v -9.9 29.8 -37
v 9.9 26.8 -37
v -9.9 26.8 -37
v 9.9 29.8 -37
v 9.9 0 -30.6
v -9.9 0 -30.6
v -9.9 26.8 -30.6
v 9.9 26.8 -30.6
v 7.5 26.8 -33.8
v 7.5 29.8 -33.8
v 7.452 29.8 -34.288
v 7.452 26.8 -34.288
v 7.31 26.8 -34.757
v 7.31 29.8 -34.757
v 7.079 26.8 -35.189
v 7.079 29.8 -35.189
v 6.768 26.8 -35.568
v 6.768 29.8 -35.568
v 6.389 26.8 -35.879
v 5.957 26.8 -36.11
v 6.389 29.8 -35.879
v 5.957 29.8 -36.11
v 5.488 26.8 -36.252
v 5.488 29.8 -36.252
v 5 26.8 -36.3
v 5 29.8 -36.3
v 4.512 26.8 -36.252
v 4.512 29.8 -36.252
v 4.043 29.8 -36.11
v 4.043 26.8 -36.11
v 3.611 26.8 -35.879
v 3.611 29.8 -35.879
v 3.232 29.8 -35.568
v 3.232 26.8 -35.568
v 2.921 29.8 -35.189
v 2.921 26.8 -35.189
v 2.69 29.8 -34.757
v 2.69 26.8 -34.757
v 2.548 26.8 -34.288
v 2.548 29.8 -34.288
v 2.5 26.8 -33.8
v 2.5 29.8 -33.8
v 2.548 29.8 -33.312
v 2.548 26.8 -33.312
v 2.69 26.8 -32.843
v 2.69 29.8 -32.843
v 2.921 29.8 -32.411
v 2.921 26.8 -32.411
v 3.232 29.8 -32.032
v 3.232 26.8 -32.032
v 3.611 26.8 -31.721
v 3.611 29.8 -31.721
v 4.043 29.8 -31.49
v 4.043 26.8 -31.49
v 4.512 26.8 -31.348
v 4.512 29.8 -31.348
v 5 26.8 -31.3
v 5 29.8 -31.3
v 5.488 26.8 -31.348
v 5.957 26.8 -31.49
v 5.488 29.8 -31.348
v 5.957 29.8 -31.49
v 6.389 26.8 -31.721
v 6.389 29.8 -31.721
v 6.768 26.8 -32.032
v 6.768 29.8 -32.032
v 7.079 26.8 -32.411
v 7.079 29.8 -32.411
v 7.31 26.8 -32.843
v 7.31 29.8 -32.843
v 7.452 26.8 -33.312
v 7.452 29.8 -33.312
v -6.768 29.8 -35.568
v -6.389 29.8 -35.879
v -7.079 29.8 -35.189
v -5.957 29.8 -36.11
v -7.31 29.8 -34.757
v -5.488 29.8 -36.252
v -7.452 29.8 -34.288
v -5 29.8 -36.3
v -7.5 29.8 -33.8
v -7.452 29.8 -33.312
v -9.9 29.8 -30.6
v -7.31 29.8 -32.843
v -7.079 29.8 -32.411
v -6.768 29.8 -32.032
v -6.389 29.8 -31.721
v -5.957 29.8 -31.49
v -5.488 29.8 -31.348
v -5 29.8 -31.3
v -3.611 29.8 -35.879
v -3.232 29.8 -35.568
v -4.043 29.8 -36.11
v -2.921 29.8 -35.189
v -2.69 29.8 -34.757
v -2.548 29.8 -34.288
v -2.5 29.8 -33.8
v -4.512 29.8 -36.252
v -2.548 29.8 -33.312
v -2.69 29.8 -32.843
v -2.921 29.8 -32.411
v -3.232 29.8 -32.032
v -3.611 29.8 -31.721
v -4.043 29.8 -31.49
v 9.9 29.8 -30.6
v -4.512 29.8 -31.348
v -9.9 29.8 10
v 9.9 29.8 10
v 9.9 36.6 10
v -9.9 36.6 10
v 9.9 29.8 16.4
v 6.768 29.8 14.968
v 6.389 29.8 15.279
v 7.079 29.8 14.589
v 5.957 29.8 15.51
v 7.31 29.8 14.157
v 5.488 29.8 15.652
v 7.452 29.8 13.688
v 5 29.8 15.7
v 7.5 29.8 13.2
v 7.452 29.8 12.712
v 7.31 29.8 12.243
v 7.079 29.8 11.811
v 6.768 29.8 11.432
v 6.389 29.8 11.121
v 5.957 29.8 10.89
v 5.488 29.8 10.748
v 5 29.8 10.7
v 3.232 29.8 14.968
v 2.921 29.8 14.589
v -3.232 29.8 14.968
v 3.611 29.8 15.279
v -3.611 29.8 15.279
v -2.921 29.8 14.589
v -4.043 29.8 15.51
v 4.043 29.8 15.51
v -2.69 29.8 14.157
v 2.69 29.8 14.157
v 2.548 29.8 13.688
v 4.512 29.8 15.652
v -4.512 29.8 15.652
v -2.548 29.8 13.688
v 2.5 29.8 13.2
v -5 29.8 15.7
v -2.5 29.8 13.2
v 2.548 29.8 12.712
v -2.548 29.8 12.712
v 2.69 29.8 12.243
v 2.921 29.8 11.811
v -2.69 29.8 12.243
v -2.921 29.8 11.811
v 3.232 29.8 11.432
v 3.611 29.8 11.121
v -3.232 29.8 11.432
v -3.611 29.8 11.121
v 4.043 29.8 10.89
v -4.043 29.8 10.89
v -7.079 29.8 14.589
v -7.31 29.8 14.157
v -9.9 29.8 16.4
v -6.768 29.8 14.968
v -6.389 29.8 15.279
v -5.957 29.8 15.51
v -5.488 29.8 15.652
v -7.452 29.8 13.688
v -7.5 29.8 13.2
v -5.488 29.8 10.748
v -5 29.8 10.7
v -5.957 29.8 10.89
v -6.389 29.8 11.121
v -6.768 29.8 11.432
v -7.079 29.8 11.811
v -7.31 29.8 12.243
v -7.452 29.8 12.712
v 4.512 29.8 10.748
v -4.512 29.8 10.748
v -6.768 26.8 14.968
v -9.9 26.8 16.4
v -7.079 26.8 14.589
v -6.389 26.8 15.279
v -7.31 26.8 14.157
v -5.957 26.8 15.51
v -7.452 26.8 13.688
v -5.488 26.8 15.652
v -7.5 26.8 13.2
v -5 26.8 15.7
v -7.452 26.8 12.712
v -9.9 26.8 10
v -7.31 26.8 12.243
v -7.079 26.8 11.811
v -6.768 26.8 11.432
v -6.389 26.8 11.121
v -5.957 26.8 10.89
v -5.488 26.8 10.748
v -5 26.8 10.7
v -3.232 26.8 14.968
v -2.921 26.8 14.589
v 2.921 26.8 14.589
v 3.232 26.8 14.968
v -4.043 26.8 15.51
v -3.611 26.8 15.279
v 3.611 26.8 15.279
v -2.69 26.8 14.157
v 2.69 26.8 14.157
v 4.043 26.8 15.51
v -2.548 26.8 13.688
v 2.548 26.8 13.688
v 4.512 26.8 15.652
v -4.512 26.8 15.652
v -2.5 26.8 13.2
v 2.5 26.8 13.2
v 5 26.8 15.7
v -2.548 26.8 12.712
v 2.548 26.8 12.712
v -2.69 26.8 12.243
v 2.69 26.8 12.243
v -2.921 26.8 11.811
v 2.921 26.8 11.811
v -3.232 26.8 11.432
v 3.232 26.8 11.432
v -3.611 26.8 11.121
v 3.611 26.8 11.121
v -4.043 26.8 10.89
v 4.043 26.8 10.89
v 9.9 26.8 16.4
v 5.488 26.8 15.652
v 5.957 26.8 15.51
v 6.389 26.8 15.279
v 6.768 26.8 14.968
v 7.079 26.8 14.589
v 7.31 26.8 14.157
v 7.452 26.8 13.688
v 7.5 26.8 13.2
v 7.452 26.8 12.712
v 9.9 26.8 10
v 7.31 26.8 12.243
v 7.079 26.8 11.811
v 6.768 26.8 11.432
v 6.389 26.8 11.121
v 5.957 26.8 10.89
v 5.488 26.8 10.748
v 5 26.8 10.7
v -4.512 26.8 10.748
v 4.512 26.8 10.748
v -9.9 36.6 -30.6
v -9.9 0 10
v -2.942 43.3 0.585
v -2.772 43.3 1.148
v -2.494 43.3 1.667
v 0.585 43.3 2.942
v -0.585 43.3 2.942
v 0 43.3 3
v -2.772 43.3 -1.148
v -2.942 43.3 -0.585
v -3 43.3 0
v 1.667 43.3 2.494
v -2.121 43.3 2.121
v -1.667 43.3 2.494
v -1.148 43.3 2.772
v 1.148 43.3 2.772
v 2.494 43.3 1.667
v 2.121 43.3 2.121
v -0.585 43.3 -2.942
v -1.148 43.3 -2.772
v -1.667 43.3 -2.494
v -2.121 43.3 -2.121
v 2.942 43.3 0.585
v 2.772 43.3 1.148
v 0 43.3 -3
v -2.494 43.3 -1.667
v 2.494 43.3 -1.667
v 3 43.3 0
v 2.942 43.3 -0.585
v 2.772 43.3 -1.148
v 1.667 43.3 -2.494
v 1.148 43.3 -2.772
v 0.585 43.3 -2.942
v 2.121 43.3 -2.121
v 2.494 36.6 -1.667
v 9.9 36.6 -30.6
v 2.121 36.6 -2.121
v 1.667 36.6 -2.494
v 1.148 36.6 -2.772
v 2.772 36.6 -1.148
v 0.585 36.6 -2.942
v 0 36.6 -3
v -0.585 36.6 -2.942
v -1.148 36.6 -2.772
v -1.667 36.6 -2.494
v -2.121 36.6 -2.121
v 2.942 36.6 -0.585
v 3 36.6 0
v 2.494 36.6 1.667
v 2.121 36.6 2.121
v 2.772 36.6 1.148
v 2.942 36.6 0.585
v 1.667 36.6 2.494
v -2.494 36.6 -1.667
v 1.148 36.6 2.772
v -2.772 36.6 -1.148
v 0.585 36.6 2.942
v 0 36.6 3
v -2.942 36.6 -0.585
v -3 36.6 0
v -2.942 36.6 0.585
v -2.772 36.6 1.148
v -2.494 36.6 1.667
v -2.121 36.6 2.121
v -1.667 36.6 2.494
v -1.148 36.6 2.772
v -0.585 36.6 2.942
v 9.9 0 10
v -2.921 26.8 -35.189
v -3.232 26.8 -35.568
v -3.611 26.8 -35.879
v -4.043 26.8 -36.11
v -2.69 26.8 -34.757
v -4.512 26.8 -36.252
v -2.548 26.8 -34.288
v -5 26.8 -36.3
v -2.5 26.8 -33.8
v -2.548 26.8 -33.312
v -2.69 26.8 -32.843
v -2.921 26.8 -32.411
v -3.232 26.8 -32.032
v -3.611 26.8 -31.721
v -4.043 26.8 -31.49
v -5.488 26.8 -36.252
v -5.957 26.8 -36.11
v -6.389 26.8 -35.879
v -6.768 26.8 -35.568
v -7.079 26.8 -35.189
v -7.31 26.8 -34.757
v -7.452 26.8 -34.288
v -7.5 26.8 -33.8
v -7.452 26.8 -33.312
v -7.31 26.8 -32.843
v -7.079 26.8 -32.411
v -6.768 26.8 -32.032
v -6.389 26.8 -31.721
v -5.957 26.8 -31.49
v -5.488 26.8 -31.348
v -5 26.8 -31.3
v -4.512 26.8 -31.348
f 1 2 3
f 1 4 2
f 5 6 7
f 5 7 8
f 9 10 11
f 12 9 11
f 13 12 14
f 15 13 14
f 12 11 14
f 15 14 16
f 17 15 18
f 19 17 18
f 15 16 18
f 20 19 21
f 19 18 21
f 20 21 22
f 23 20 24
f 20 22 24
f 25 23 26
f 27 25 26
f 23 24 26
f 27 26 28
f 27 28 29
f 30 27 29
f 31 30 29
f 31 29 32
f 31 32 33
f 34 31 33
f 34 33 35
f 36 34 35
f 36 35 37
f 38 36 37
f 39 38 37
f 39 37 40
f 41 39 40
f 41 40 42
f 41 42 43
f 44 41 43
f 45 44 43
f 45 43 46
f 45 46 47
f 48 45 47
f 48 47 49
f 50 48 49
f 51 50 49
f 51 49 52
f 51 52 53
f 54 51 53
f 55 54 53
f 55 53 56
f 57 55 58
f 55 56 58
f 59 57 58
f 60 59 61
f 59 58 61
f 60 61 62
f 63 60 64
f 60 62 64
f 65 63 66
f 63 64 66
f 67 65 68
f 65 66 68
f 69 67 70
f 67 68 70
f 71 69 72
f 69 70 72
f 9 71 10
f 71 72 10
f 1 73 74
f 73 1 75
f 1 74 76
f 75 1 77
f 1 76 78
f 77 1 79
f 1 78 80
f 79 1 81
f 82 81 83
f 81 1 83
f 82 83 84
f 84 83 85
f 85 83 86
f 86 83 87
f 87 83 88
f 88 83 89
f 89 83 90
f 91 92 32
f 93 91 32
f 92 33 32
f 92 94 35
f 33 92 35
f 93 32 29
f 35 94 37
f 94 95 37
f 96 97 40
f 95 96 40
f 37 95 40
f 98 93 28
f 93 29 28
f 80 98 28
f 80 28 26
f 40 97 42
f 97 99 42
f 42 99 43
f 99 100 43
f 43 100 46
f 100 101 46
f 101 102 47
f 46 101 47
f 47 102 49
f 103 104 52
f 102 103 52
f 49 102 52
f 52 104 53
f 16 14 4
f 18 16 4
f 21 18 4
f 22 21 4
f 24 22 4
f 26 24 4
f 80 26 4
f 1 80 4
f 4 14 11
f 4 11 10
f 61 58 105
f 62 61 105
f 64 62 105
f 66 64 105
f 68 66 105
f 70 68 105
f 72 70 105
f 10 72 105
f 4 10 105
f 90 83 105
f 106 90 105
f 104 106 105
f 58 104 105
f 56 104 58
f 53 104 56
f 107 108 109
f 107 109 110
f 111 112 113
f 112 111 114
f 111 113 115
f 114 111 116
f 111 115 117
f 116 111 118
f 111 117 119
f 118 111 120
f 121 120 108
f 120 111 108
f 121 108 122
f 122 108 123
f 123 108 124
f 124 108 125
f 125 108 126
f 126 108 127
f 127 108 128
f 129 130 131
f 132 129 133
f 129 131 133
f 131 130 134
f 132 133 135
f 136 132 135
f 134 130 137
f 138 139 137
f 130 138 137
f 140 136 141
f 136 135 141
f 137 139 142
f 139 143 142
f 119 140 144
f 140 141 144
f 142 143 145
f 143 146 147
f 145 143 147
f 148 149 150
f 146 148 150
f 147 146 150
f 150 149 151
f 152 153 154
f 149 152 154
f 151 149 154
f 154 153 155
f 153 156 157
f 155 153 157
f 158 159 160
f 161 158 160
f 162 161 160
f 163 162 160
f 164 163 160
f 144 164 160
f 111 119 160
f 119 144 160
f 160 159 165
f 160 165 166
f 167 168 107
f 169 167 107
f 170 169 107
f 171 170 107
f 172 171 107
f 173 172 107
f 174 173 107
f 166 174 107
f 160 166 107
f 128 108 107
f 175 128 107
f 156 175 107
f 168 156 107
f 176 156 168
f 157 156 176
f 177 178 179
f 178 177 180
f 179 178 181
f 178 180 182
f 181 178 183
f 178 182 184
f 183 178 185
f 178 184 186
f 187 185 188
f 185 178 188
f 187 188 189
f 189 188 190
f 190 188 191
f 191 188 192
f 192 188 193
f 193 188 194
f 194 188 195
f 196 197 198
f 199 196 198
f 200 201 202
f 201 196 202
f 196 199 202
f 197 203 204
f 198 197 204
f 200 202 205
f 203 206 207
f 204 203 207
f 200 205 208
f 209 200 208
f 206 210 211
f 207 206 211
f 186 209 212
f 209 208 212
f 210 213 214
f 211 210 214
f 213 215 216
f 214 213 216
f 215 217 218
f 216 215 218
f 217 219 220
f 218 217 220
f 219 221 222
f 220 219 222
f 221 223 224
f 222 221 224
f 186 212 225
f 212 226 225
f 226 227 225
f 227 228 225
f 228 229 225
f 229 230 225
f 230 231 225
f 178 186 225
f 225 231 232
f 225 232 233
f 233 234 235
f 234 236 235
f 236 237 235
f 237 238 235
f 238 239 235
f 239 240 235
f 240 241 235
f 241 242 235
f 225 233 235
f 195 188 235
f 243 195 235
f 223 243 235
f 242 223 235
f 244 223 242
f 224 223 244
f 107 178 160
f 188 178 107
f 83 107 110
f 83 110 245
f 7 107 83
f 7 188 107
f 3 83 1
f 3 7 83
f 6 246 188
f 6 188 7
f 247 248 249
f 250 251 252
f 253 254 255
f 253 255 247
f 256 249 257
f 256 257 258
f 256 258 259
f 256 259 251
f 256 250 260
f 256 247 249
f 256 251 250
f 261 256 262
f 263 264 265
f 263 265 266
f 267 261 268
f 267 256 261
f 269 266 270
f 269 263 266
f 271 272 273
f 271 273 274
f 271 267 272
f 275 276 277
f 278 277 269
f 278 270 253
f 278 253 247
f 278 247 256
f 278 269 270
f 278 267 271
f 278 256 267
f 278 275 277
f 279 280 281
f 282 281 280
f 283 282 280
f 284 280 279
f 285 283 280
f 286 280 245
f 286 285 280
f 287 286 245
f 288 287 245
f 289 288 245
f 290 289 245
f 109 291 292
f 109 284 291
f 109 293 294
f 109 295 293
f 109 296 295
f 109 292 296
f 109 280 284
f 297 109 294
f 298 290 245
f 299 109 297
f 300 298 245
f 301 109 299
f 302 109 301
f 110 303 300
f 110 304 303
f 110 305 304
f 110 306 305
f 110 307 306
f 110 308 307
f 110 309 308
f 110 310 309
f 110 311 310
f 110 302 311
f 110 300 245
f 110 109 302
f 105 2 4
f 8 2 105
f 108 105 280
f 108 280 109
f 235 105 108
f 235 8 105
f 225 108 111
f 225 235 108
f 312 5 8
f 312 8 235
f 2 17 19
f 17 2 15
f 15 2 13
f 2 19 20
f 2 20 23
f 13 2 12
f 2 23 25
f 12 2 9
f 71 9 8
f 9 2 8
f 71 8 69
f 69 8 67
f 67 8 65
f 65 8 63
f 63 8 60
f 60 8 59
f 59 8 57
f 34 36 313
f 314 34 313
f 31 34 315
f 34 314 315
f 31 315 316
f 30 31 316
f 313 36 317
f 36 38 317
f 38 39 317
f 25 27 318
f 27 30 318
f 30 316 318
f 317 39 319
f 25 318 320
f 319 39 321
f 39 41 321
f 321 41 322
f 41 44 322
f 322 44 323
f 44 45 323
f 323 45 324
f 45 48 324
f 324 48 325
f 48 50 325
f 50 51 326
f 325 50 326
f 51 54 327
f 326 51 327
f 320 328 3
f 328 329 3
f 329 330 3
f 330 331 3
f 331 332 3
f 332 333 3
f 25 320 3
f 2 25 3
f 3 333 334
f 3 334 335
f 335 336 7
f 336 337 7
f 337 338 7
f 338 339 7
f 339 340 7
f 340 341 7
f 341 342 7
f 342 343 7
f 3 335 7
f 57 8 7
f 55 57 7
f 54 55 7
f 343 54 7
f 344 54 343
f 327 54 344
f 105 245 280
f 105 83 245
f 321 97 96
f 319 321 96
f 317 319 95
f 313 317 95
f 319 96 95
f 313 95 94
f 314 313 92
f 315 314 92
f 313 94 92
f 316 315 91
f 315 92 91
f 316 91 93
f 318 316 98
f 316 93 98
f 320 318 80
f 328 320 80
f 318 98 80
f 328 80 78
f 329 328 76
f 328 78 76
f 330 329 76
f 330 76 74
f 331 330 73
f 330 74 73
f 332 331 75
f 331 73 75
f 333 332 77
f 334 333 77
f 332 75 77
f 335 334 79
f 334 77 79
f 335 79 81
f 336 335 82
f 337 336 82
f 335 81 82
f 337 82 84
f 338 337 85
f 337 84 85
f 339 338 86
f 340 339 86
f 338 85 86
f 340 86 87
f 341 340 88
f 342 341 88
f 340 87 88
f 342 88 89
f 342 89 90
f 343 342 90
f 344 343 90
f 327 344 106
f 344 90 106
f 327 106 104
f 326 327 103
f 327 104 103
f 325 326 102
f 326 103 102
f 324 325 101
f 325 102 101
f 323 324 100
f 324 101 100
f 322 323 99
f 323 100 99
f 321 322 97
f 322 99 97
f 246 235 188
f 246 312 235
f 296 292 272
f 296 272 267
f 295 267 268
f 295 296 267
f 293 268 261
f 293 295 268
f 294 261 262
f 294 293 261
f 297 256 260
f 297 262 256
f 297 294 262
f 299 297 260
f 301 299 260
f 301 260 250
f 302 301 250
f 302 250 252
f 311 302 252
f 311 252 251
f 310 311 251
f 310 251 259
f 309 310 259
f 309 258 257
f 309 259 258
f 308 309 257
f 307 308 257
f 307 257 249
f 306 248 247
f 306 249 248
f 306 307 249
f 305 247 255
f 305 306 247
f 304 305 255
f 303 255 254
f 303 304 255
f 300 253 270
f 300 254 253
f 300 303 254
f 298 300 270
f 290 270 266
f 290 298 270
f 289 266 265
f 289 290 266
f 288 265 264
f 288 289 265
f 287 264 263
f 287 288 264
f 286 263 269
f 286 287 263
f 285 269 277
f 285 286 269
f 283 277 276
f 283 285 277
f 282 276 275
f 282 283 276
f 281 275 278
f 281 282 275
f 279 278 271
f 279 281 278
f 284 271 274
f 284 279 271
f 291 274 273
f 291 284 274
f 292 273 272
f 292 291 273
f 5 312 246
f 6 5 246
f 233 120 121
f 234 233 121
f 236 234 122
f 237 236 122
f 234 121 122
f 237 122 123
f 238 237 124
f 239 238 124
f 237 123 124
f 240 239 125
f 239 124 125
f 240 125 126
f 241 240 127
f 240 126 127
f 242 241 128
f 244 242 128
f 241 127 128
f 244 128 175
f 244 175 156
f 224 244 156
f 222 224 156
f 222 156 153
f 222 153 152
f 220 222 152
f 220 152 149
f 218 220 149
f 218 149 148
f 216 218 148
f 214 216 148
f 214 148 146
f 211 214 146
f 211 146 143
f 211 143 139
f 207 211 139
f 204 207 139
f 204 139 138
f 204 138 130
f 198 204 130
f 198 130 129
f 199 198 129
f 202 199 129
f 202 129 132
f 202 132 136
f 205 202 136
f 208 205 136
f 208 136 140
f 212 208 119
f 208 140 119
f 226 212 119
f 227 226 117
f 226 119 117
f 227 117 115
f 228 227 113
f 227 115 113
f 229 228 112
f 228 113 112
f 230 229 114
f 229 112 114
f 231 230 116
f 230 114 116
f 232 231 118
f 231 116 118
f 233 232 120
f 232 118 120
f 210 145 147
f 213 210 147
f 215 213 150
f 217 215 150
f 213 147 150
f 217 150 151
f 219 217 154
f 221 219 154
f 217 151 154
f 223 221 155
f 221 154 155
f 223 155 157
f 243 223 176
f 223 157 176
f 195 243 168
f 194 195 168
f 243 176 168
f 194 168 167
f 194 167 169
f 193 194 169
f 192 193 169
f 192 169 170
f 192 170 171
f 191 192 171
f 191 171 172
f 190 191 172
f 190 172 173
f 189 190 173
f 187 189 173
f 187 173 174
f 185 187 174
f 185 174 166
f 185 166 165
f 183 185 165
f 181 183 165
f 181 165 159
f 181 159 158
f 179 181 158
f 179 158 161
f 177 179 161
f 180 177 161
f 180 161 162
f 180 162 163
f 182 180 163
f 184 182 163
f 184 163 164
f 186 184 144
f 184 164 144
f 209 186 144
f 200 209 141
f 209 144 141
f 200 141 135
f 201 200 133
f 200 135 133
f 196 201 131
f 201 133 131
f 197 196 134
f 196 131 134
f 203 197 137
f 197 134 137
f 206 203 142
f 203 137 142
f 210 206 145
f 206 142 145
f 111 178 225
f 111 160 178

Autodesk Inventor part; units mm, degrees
ref_plane "YZ Plane" through (0, 0, 0) normal (1, 0, 0) x (0, 1, 0)
ref_plane "XZ Plane" through (0, 0, 0) normal (0, 1, 0) x (-1, 0, 0)
ref_plane "XY Plane" through (0, 0, 0) normal (0, 0, 1) x (1, 0, 0)
sketch "servo_base" plane through (0, 0, 0) normal (0, 1, 0) x (-1, 0, 0)
  line L0 (-9.9, 10) -> (9.9, 10)
  line L1 (9.9, 10) -> (9.9, -30.6)
  line L2 (9.9, -30.6) -> (-9.9, -30.6)
  line L3 (-9.9, -30.6) -> (-9.9, 10)
  point P0 (0, 0)
  dimension "length" = 40.6
  dimension "width" = 19.8
  dimension "axe_dist" = 10
  dimension "d3" = 9.9
extrude "servo_body" add sketch "servo_base" along normal blind 36.6
sketch "handle1_base" plane through (-9.9, 0, 10) normal (0, 0, 1) x (1, 0, 0)
  line L0 (19.8, 0) -> (0, 0) projected
  line L1 (19.8, 0) -> (19.8, 36.6) projected
  line L2 (0, 0) -> (0, 36.6) projected
  line L3 (0, 26.8) -> (19.8, 26.8)
  line L4 (19.8, 26.8) -> (19.8, 29.8)
  line L5 (19.8, 29.8) -> (0, 29.8)
  line L6 (0, 29.8) -> (0, 26.8)
  point P0 (9.9, 0)
  dimension "handle_height" = 26.8
  dimension "handle_thickness" = 3
extrude "handle1" add sketch "handle1_base" along normal blind 6.4 contours L3 L2 L5 L1
sketch "handle2_base" plane through (9.9, 0, -30.6) normal (0, 0, -1) x (-1, 0, 0)
  line L0 (19.8, 0) -> (0, 0) projected
  line L1 (19.8, 0) -> (19.8, 36.6) projected
  line L2 (0, 0) -> (0, 36.6) projected
  line L3 (0, 26.8) -> (19.8, 26.8)
  line L4 (19.8, 26.8) -> (19.8, 29.8)
  line L5 (19.8, 29.8) -> (0, 29.8)
  line L6 (0, 29.8) -> (0, 26.8)
  point P0 (9.9, 0)
  dimension "d10" = 26.8
  dimension "d11" = 3
extrude "handle2" add sketch "handle2_base" along normal blind 6.4 contours L3 L2 L5 L1
sketch "hole1_right_base" plane through (-9.9, 29.8, 10) normal (0, 1, 0) x (1, 0, 0)
  line L0 (19.8, -6.4) -> (0, -6.4) projected
  line L1 (19.8, 0) -> (19.8, -6.4) projected
  line L2 (0, 0) -> (9.9, 0)
  line L3 (9.9, 0) -> (9.9, -6.4)
  line L4 (9.9, -6.4) -> (0, -6.4)
  line L5 (0, -6.4) -> (0, 0)
  circle A0 centre (4.9, -3.2) radius 2.5
  point P0 (9.9, 10)
  dimension "d14" = 9.9
  dimension "hole_dist" = 5
  dimension "d16" = 3.2
  dimension "hole_diameter" = 5
extrude "hole1_rigth" cut sketch "hole1_right_base" against normal up to next contours A0
sketch "hole1_left_base" plane through (-9.9, 29.8, 10) normal (0, 1, 0) x (1, 0, 0)
  line L0 (0, 0) -> (0, -6.4) projected
  line L1 (19.8, -6.4) -> (0, -6.4) projected
  line L2 (19.8, 0) -> (9.9, 0)
  line L3 (9.9, 0) -> (9.9, -6.4)
  line L4 (9.9, -6.4) -> (19.8, -6.4)
  line L5 (19.8, -6.4) -> (19.8, 0)
  circle A0 centre (14.9, -3.2) radius 2.5
  point P0 (9.9, 10)
  dimension "d20" = 9.9
  dimension "d21" = 3.2
  dimension "d22" = 5
  dimension "d23" = 5
extrude "hole1_left" cut sketch "hole1_left_base" against normal up to next contours A0
sketch "hole2_right_base" plane through (-9.9, 29.8, -30.6) normal (0, 1, 0) x (1, 0, 0)
  line L0 (19.8, 0) -> (0, 0) projected
  line L1 (19.8, 0) -> (19.8, 6.4) projected
  line L2 (0, 6.4) -> (19.8, 6.4) projected
  line L3 (0, 6.4) -> (9.9, 6.4)
  line L4 (9.9, 6.4) -> (9.9, 0)
  line L5 (9.9, 0) -> (0, 0)
  line L6 (0, 0) -> (0, 6.4)
  circle A0 centre (4.9, 3.2) radius 2.5
  point P0 (9.9, -30.6)
  dimension "d26" = 9.9
  dimension "d27" = 5
  dimension "d28" = 3.2
  dimension "d29" = 5
extrude "hole2_right" cut sketch "hole2_right_base" against normal up to next contours A0
sketch "hole2_left_base" plane through (-9.9, 29.8, -30.6) normal (0, 1, 0) x (1, 0, 0)
  line L0 (19.8, 0) -> (0, 0) projected
  line L1 (0, 6.4) -> (19.8, 6.4) projected
  line L2 (0, 0) -> (0, 6.4) projected
  line L3 (19.8, 6.4) -> (9.9, 6.4)
  line L4 (9.9, 6.4) -> (9.9, 0)
  line L5 (9.9, 0) -> (19.8, 0)
  line L6 (19.8, 0) -> (19.8, 6.4)
  circle A0 centre (14.9, 3.2) radius 2.5
  point P0 (9.9, -30.6)
  dimension "d32" = 9.9
  dimension "d33" = 5
  dimension "d34" = 5
  dimension "d35" = 3.2
extrude "hole2_left" cut sketch "hole2_left_base" against normal up to next contours A0
sketch "axe_base" plane through (0, 36.6, 0) normal (0, 1, 0) x (1, 0, 0)
  circle A0 centre (0, 0) radius 3
  line L0 (-9.9, -10) -> (9.9, -10) projected
  line L1 (0, 0) -> (0, -10) construction
  dimension "axe_diameter" = 6
  dimension "d41" = 10
extrude "axe" add sketch "axe_base" along normal blind 6.7
equation "\"d3\" = 0.5 * width"
equation "\"d10\" = handle_height"
equation "\"d11\" = handle_thickness"
equation "\"d12\" = handle_length"
equation "\"d14\" = 0.5 * width"
equation "\"d16\" = 0.5 * handle_length"
equation "\"d18\" = handle_length"
equation "\"d20\" = 0.5 * width"
equation "\"d21\" = 0.5 * handle_length"
equation "\"d22\" = hole_dist"
equation "\"d23\" = hole_diameter"
equation "\"d24\" = handle_length"
equation "\"d26\" = 0.5 * width"
equation "\"d27\" = hole_dist"
equation "\"d28\" = 0.5 * handle_length"
equation "\"d29\" = hole_diameter"
equation "\"d30\" = handle_length"
equation "\"d32\" = 0.5 * width"
equation "\"d33\" = hole_diameter"
equation "\"d34\" = hole_dist"
equation "\"d35\" = 0.5 * handle_length"
equation "\"d36\" = handle_length"
equation "\"handle_length\" = 6.4"
properties part number "servo"
